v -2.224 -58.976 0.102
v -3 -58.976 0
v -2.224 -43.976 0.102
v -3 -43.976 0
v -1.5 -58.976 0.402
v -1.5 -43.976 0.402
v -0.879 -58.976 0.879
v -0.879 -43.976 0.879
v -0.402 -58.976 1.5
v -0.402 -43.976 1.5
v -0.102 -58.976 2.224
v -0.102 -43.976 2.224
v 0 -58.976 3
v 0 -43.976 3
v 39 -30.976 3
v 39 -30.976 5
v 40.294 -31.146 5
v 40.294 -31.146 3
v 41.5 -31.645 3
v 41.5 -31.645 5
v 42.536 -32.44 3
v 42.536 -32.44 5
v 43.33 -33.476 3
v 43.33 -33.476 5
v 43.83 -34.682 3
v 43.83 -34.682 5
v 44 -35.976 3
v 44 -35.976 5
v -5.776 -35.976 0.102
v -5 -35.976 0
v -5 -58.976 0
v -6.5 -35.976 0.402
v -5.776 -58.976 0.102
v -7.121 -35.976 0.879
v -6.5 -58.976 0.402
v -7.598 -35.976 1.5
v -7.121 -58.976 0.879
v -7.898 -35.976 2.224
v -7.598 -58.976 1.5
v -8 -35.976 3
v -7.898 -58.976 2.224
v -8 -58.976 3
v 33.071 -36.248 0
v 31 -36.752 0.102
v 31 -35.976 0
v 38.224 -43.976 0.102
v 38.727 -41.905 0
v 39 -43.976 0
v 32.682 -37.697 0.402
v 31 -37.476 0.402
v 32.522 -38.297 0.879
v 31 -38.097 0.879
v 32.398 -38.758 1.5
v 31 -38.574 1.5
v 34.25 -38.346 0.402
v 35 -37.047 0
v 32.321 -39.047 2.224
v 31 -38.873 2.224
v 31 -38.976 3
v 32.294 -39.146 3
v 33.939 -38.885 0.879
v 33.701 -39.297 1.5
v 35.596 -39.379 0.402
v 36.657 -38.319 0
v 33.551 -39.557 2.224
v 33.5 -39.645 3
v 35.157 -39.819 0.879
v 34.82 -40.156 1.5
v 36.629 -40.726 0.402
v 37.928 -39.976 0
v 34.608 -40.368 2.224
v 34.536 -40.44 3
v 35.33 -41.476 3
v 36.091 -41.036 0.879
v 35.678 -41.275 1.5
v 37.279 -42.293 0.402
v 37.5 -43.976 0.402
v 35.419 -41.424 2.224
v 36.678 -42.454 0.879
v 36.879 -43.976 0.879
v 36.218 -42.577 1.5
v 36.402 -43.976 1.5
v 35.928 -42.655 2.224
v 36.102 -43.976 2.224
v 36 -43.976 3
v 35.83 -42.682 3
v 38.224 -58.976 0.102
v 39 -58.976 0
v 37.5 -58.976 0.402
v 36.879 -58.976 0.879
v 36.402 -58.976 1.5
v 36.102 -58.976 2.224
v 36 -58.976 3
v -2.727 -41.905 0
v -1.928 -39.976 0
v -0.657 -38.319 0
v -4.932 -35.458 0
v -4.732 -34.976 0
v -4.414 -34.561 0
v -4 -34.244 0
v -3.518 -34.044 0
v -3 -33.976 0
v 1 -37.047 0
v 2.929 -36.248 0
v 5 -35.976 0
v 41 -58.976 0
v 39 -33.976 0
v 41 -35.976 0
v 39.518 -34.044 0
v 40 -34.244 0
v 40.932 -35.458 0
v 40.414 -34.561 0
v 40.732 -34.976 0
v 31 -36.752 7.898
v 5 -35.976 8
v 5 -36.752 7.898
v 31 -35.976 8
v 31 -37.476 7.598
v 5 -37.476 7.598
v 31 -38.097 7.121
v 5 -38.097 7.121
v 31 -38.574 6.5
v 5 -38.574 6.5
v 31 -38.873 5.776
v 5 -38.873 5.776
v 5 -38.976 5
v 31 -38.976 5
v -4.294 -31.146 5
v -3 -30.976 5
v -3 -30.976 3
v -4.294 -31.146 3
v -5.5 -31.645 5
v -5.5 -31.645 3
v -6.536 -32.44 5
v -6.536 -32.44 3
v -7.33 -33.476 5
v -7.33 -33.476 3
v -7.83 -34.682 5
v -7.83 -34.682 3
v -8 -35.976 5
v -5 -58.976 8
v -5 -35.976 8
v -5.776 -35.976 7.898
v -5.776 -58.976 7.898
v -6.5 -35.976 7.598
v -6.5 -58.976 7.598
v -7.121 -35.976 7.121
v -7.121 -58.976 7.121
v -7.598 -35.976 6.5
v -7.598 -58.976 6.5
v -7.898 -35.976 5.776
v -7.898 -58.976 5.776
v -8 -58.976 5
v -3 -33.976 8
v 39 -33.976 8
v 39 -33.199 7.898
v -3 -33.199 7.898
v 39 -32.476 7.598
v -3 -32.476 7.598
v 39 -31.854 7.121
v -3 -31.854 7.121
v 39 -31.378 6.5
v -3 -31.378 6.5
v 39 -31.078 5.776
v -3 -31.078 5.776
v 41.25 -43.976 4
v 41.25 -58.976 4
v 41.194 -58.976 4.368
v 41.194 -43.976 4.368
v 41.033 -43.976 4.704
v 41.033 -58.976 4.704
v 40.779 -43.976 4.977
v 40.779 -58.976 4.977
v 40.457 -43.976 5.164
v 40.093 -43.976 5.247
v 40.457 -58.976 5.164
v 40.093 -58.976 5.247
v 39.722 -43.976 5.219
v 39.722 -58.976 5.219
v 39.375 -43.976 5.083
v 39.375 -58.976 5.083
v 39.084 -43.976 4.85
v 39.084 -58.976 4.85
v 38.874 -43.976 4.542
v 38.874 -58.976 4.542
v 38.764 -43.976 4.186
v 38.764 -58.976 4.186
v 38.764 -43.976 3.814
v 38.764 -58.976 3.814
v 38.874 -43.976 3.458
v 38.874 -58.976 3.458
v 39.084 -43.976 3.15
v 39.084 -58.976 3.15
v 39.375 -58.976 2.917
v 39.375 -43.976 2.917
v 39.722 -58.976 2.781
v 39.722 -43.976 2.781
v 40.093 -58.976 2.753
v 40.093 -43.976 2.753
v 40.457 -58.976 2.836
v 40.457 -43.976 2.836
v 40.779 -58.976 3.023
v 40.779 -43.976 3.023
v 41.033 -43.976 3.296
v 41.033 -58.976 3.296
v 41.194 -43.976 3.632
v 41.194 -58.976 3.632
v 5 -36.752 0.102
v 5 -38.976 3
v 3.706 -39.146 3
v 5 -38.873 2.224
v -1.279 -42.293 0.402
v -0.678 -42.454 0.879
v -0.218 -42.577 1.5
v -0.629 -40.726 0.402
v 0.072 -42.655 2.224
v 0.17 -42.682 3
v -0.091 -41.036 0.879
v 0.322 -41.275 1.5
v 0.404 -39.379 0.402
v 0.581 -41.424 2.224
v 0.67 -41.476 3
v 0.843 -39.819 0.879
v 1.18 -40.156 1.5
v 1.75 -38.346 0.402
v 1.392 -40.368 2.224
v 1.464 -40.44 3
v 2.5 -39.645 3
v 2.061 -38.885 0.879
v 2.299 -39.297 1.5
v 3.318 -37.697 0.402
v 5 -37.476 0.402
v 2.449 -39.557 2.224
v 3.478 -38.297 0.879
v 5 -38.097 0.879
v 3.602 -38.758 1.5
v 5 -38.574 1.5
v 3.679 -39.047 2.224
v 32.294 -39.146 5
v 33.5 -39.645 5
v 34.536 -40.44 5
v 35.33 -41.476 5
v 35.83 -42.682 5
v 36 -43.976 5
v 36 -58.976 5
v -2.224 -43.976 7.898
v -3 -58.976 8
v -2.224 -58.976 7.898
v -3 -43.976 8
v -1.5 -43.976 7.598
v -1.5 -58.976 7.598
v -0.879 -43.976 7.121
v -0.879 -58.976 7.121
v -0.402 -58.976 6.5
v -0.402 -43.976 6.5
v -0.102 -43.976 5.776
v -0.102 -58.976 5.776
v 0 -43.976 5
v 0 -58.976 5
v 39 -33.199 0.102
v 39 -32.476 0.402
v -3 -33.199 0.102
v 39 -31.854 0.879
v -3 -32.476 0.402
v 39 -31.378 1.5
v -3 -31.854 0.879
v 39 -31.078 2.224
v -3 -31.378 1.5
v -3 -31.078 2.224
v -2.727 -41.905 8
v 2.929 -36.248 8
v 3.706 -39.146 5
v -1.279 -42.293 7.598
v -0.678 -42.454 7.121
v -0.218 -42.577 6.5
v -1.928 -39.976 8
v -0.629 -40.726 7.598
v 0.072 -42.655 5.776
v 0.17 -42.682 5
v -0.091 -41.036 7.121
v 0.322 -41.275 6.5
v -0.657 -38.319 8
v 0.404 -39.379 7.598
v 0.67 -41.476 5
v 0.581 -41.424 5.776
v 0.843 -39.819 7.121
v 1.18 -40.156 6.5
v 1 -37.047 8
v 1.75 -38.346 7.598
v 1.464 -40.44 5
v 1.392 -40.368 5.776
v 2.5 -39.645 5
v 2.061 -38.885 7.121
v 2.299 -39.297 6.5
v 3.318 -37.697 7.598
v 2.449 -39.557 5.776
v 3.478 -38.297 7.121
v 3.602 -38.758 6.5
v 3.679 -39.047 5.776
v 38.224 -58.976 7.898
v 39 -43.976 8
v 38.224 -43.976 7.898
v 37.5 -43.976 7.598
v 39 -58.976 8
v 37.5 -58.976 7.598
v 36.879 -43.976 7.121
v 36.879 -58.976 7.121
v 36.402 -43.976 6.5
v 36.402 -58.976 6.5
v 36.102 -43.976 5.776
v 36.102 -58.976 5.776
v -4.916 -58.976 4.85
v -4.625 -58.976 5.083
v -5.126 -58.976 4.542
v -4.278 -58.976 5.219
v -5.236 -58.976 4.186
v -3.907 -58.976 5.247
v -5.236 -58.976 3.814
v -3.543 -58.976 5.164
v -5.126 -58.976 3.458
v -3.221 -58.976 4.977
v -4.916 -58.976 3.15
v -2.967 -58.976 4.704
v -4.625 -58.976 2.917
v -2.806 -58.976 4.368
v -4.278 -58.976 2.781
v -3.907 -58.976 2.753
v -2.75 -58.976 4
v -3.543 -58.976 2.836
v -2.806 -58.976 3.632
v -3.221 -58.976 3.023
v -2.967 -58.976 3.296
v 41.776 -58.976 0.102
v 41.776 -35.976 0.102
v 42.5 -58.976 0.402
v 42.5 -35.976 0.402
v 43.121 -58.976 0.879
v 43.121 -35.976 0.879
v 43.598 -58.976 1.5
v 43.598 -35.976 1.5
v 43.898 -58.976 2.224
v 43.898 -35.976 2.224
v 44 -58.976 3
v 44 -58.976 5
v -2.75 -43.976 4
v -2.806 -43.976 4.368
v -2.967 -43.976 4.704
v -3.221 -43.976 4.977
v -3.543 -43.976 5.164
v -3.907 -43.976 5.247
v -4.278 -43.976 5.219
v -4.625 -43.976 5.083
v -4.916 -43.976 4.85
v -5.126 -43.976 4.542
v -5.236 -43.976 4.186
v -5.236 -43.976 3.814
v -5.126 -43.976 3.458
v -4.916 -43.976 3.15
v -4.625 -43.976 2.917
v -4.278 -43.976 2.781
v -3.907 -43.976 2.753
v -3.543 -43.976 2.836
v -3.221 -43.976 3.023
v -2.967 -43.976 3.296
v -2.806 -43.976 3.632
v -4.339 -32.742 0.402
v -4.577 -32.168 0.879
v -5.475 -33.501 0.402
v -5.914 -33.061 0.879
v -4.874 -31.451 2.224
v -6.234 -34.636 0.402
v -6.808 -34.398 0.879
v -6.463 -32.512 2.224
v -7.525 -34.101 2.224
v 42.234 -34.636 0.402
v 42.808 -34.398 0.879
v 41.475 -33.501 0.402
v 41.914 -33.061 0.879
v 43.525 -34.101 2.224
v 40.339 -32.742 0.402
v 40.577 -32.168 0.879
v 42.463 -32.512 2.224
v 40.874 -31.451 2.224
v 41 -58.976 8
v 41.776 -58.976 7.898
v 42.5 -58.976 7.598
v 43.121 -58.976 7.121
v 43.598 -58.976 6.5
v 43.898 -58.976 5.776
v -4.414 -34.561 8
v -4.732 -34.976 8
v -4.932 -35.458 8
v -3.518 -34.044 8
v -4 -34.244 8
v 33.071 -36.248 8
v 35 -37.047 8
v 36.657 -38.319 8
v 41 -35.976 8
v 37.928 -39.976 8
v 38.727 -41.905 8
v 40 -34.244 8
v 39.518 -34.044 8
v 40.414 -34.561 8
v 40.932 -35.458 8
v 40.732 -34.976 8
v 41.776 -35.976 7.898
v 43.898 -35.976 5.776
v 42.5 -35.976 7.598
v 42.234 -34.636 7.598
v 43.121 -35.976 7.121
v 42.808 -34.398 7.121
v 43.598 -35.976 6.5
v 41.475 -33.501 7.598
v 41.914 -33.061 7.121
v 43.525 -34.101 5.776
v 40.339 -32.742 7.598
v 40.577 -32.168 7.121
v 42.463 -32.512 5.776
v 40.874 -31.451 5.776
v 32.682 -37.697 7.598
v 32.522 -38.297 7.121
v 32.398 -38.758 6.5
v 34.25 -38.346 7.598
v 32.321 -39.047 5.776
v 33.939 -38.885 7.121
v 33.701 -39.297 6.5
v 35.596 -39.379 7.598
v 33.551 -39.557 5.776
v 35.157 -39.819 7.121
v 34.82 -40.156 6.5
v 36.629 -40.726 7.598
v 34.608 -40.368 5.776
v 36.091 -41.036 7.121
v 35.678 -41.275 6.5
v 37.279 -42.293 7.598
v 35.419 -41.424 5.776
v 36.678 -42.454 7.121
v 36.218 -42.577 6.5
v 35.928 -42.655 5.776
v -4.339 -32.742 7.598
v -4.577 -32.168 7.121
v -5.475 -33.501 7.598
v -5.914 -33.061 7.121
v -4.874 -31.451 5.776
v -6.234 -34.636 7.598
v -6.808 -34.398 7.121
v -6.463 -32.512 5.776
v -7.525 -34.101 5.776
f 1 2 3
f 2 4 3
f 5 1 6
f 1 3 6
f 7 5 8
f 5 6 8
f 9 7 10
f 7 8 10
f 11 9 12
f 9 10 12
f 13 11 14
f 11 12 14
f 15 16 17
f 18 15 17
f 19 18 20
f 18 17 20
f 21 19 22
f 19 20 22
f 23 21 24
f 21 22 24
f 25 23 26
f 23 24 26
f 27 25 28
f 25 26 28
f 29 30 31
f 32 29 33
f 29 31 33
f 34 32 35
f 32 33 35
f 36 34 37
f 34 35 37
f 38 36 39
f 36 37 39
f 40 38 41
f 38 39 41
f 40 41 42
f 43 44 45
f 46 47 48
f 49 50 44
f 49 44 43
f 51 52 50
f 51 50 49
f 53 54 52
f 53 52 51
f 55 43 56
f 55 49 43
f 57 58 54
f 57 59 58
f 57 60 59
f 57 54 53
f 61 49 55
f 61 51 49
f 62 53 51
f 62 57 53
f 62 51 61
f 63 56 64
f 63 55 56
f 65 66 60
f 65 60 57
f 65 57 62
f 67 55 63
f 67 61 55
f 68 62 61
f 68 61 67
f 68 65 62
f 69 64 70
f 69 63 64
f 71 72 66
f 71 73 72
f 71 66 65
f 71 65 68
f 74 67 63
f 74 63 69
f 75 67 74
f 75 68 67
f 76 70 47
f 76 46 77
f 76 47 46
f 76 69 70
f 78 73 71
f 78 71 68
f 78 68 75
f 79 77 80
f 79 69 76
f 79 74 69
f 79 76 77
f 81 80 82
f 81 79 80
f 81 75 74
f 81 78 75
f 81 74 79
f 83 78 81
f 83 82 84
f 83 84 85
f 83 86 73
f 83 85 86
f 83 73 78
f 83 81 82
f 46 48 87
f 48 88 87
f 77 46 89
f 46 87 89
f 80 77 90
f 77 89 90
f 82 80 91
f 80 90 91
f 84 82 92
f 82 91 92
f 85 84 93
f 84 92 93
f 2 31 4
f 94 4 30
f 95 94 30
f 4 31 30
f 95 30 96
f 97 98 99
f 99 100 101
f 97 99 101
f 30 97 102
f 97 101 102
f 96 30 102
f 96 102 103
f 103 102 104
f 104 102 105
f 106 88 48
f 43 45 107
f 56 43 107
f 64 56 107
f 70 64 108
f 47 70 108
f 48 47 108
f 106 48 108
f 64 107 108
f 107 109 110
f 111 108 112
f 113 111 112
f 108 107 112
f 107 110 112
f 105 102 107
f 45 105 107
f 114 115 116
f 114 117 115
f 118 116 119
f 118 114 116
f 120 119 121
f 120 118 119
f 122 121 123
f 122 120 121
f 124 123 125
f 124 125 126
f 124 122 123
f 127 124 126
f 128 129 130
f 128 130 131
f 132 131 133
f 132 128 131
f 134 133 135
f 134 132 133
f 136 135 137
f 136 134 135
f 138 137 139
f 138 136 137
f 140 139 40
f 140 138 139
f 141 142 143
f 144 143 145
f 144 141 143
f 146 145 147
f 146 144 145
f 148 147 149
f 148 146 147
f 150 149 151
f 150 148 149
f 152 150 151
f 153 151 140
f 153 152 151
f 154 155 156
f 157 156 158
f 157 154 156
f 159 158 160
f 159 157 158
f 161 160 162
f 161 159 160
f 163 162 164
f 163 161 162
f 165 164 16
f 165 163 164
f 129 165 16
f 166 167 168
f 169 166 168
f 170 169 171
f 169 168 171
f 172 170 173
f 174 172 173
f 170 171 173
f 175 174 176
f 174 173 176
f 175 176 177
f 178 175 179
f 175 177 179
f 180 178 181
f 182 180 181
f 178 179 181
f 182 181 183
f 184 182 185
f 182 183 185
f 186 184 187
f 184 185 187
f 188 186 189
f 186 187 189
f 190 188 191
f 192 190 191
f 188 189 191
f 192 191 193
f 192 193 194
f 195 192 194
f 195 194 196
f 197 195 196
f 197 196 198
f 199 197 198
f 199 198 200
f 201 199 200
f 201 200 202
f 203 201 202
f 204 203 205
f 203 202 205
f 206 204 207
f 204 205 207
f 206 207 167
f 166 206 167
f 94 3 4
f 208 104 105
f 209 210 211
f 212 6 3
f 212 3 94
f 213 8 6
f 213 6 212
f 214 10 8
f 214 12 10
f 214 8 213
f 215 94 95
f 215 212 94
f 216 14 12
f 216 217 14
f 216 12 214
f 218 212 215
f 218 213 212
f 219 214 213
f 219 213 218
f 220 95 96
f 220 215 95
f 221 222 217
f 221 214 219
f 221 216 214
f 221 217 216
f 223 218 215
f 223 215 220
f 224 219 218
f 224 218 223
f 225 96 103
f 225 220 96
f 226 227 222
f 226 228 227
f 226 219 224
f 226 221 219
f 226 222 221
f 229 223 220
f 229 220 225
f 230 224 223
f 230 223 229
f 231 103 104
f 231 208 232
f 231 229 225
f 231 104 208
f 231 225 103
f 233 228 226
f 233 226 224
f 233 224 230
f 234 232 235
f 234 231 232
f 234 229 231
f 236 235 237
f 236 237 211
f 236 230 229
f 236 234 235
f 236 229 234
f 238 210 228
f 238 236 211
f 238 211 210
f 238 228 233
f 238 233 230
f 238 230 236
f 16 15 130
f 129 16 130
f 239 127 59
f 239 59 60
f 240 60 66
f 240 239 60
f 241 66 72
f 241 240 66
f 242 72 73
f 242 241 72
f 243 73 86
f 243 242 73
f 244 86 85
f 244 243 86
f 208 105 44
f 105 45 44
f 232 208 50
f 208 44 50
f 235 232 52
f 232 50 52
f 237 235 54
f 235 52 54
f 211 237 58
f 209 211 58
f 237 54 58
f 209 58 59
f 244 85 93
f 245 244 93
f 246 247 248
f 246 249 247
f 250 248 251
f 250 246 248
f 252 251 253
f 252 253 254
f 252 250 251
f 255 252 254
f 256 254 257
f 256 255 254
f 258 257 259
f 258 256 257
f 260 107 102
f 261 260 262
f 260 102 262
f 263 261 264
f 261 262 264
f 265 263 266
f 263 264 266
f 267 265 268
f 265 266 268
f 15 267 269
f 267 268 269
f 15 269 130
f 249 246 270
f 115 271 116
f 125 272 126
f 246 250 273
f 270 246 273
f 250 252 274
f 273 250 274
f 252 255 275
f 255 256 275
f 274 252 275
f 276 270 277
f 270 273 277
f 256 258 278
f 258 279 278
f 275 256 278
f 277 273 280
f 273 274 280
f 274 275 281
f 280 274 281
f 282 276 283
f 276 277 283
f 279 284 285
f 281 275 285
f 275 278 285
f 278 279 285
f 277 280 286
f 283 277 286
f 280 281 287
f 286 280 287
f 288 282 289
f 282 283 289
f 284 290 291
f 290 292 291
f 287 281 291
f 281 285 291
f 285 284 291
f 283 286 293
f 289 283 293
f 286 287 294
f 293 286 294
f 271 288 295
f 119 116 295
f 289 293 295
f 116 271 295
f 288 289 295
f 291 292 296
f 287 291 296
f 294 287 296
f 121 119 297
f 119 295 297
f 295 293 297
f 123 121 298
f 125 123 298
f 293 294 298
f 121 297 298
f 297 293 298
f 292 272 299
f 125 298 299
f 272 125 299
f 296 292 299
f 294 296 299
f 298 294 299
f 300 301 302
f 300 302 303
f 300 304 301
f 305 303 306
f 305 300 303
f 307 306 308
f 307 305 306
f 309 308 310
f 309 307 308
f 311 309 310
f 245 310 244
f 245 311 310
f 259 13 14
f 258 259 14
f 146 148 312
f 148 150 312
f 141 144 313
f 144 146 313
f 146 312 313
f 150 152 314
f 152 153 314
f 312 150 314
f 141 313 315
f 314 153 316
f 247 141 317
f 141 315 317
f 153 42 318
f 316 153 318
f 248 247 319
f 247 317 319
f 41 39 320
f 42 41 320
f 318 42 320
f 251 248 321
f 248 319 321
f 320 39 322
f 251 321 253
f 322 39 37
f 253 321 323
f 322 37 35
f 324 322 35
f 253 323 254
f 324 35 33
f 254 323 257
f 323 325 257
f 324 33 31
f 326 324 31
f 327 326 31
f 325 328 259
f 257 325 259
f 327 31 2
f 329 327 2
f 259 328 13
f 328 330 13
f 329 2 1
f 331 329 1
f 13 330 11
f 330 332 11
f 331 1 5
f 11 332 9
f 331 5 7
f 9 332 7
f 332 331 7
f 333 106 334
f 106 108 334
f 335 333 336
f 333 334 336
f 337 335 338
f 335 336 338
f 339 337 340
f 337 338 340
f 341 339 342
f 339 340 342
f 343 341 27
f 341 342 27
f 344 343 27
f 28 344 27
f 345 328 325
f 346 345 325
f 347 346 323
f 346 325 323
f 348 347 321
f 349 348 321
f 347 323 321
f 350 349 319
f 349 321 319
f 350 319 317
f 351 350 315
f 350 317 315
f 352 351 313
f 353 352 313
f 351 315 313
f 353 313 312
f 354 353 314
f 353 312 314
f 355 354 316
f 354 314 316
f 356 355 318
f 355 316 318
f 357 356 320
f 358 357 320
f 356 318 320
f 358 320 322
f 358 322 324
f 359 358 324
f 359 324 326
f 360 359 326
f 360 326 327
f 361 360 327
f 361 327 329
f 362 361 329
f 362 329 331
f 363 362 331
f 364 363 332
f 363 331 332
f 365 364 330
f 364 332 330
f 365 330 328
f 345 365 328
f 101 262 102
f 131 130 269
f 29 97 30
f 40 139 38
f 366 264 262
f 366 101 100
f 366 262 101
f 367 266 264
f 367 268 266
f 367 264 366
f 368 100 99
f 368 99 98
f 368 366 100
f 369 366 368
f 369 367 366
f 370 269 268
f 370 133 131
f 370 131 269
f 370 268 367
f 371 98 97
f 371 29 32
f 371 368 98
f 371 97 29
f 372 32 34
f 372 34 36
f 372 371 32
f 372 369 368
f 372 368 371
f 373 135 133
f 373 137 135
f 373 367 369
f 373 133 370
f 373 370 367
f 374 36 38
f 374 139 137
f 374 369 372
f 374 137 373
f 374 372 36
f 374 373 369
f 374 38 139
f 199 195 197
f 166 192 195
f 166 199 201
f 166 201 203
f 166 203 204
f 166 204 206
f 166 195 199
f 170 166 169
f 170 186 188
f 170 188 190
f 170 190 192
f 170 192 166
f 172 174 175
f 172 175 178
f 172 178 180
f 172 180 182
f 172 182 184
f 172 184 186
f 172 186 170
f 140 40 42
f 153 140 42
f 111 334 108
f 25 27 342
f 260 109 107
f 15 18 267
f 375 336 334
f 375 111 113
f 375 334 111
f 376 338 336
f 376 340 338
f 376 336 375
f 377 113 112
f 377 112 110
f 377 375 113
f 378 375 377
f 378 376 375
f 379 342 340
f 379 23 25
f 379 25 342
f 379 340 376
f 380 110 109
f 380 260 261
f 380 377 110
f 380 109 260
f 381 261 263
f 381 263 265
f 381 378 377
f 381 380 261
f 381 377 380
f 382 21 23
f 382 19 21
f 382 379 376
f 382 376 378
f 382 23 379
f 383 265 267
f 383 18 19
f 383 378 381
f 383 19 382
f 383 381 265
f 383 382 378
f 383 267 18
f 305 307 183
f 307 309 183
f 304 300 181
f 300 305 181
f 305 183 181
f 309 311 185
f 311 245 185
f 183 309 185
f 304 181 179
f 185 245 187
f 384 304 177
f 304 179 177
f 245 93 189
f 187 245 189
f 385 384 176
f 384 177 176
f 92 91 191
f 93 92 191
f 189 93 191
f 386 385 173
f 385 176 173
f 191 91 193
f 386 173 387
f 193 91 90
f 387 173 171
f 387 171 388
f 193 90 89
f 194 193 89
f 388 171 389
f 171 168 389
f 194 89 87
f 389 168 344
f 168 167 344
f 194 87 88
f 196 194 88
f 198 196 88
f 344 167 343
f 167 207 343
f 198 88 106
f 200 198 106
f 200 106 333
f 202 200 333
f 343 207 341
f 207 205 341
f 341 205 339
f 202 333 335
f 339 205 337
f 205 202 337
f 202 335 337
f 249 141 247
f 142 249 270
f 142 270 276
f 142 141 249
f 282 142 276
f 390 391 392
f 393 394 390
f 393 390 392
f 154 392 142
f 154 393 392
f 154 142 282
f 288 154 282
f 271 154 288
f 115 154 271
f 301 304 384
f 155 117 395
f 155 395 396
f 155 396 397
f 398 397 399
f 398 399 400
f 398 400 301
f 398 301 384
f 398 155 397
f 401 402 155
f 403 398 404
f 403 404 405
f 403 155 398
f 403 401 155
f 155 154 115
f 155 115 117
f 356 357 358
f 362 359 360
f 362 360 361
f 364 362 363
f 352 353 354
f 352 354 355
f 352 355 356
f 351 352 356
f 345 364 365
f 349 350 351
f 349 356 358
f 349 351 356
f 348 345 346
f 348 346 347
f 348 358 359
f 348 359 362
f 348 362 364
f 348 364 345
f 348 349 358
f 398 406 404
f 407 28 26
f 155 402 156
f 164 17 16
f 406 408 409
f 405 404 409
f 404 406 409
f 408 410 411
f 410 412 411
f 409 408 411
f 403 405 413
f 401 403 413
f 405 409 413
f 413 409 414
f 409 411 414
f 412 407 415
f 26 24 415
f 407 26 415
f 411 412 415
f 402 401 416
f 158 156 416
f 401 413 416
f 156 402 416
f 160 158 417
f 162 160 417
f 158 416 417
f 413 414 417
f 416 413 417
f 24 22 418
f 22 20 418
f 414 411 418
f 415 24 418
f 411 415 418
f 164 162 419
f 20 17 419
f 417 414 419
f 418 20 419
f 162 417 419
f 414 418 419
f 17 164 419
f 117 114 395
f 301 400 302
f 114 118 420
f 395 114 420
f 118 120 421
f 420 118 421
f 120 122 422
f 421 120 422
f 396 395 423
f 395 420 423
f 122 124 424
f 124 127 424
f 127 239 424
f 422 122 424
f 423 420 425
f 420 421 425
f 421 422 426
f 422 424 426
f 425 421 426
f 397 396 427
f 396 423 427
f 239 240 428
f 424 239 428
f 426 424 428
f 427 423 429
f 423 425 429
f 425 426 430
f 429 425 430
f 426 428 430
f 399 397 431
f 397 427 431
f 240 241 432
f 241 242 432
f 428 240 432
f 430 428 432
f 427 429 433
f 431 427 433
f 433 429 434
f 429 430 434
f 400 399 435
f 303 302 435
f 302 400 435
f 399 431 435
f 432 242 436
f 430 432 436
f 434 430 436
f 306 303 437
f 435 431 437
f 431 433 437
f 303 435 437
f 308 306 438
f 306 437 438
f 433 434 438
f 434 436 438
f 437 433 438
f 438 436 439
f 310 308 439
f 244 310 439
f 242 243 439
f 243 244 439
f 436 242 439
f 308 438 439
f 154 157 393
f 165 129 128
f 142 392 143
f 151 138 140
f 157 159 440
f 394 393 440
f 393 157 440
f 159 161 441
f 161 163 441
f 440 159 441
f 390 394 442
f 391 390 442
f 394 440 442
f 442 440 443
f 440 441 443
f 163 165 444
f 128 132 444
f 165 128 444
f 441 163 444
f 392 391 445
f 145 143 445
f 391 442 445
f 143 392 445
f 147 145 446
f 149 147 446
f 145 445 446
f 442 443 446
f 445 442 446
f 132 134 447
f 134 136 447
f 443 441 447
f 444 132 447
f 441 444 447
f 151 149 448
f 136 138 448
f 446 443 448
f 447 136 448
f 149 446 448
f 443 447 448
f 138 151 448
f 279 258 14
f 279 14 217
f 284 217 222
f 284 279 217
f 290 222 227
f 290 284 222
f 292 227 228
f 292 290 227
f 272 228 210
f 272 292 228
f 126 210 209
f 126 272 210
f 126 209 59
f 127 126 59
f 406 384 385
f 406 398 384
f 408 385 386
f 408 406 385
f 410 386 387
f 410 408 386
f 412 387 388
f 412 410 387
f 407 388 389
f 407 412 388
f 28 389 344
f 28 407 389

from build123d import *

# Parameters (mm, degrees)
F1_DEPTH = 8
F2_R     = 5
F3_R     = 3
F4_R     = 1.25
F5_DEPTH = 15


with BuildPart() as f1:
    # F0 (on Top) → F1 (new body)
    with BuildSketch(Plane.XY):
        Polygon((44, -30.975605), (-8, -30.975605), (-8, -58.975605), (0, -58.975605), (0, -38.975605), (36, -38.975605), (36, -58.975605), (44, -58.975605), align=None)
    extrude(amount=F1_DEPTH)

    # F2
    f2_edges = [f1.edges().sort_by_distance(p)[0] for p in [
        (-8, -30.975605, 4),
        (44, -30.975605, 4),
        (0, -38.975605, 4),
        (36, -38.975605, 4),
    ]]
    fillet(f2_edges, radius=F2_R)

    # F3
    f3_edges = [f1.edges().sort_by_distance(p)[0] for p in [
        (18, -38.975605, 8),
        (44, -47.475605, 8),
        (44, -47.475605, 0),
        (36, -51.475605, 0),
    ]]
    fillet(f3_edges, radius=F3_R)

    # F4 (on face) → F5 (cut)
    with BuildSketch(Plane.XZ.offset(58.975605)):
        with Locations((40, 4)):
            Circle(F4_R)
        with Locations((-4, 4)):
            Circle(F4_R)
    extrude(amount=-F5_DEPTH, mode=Mode.SUBTRACT)


solid = f1.part
